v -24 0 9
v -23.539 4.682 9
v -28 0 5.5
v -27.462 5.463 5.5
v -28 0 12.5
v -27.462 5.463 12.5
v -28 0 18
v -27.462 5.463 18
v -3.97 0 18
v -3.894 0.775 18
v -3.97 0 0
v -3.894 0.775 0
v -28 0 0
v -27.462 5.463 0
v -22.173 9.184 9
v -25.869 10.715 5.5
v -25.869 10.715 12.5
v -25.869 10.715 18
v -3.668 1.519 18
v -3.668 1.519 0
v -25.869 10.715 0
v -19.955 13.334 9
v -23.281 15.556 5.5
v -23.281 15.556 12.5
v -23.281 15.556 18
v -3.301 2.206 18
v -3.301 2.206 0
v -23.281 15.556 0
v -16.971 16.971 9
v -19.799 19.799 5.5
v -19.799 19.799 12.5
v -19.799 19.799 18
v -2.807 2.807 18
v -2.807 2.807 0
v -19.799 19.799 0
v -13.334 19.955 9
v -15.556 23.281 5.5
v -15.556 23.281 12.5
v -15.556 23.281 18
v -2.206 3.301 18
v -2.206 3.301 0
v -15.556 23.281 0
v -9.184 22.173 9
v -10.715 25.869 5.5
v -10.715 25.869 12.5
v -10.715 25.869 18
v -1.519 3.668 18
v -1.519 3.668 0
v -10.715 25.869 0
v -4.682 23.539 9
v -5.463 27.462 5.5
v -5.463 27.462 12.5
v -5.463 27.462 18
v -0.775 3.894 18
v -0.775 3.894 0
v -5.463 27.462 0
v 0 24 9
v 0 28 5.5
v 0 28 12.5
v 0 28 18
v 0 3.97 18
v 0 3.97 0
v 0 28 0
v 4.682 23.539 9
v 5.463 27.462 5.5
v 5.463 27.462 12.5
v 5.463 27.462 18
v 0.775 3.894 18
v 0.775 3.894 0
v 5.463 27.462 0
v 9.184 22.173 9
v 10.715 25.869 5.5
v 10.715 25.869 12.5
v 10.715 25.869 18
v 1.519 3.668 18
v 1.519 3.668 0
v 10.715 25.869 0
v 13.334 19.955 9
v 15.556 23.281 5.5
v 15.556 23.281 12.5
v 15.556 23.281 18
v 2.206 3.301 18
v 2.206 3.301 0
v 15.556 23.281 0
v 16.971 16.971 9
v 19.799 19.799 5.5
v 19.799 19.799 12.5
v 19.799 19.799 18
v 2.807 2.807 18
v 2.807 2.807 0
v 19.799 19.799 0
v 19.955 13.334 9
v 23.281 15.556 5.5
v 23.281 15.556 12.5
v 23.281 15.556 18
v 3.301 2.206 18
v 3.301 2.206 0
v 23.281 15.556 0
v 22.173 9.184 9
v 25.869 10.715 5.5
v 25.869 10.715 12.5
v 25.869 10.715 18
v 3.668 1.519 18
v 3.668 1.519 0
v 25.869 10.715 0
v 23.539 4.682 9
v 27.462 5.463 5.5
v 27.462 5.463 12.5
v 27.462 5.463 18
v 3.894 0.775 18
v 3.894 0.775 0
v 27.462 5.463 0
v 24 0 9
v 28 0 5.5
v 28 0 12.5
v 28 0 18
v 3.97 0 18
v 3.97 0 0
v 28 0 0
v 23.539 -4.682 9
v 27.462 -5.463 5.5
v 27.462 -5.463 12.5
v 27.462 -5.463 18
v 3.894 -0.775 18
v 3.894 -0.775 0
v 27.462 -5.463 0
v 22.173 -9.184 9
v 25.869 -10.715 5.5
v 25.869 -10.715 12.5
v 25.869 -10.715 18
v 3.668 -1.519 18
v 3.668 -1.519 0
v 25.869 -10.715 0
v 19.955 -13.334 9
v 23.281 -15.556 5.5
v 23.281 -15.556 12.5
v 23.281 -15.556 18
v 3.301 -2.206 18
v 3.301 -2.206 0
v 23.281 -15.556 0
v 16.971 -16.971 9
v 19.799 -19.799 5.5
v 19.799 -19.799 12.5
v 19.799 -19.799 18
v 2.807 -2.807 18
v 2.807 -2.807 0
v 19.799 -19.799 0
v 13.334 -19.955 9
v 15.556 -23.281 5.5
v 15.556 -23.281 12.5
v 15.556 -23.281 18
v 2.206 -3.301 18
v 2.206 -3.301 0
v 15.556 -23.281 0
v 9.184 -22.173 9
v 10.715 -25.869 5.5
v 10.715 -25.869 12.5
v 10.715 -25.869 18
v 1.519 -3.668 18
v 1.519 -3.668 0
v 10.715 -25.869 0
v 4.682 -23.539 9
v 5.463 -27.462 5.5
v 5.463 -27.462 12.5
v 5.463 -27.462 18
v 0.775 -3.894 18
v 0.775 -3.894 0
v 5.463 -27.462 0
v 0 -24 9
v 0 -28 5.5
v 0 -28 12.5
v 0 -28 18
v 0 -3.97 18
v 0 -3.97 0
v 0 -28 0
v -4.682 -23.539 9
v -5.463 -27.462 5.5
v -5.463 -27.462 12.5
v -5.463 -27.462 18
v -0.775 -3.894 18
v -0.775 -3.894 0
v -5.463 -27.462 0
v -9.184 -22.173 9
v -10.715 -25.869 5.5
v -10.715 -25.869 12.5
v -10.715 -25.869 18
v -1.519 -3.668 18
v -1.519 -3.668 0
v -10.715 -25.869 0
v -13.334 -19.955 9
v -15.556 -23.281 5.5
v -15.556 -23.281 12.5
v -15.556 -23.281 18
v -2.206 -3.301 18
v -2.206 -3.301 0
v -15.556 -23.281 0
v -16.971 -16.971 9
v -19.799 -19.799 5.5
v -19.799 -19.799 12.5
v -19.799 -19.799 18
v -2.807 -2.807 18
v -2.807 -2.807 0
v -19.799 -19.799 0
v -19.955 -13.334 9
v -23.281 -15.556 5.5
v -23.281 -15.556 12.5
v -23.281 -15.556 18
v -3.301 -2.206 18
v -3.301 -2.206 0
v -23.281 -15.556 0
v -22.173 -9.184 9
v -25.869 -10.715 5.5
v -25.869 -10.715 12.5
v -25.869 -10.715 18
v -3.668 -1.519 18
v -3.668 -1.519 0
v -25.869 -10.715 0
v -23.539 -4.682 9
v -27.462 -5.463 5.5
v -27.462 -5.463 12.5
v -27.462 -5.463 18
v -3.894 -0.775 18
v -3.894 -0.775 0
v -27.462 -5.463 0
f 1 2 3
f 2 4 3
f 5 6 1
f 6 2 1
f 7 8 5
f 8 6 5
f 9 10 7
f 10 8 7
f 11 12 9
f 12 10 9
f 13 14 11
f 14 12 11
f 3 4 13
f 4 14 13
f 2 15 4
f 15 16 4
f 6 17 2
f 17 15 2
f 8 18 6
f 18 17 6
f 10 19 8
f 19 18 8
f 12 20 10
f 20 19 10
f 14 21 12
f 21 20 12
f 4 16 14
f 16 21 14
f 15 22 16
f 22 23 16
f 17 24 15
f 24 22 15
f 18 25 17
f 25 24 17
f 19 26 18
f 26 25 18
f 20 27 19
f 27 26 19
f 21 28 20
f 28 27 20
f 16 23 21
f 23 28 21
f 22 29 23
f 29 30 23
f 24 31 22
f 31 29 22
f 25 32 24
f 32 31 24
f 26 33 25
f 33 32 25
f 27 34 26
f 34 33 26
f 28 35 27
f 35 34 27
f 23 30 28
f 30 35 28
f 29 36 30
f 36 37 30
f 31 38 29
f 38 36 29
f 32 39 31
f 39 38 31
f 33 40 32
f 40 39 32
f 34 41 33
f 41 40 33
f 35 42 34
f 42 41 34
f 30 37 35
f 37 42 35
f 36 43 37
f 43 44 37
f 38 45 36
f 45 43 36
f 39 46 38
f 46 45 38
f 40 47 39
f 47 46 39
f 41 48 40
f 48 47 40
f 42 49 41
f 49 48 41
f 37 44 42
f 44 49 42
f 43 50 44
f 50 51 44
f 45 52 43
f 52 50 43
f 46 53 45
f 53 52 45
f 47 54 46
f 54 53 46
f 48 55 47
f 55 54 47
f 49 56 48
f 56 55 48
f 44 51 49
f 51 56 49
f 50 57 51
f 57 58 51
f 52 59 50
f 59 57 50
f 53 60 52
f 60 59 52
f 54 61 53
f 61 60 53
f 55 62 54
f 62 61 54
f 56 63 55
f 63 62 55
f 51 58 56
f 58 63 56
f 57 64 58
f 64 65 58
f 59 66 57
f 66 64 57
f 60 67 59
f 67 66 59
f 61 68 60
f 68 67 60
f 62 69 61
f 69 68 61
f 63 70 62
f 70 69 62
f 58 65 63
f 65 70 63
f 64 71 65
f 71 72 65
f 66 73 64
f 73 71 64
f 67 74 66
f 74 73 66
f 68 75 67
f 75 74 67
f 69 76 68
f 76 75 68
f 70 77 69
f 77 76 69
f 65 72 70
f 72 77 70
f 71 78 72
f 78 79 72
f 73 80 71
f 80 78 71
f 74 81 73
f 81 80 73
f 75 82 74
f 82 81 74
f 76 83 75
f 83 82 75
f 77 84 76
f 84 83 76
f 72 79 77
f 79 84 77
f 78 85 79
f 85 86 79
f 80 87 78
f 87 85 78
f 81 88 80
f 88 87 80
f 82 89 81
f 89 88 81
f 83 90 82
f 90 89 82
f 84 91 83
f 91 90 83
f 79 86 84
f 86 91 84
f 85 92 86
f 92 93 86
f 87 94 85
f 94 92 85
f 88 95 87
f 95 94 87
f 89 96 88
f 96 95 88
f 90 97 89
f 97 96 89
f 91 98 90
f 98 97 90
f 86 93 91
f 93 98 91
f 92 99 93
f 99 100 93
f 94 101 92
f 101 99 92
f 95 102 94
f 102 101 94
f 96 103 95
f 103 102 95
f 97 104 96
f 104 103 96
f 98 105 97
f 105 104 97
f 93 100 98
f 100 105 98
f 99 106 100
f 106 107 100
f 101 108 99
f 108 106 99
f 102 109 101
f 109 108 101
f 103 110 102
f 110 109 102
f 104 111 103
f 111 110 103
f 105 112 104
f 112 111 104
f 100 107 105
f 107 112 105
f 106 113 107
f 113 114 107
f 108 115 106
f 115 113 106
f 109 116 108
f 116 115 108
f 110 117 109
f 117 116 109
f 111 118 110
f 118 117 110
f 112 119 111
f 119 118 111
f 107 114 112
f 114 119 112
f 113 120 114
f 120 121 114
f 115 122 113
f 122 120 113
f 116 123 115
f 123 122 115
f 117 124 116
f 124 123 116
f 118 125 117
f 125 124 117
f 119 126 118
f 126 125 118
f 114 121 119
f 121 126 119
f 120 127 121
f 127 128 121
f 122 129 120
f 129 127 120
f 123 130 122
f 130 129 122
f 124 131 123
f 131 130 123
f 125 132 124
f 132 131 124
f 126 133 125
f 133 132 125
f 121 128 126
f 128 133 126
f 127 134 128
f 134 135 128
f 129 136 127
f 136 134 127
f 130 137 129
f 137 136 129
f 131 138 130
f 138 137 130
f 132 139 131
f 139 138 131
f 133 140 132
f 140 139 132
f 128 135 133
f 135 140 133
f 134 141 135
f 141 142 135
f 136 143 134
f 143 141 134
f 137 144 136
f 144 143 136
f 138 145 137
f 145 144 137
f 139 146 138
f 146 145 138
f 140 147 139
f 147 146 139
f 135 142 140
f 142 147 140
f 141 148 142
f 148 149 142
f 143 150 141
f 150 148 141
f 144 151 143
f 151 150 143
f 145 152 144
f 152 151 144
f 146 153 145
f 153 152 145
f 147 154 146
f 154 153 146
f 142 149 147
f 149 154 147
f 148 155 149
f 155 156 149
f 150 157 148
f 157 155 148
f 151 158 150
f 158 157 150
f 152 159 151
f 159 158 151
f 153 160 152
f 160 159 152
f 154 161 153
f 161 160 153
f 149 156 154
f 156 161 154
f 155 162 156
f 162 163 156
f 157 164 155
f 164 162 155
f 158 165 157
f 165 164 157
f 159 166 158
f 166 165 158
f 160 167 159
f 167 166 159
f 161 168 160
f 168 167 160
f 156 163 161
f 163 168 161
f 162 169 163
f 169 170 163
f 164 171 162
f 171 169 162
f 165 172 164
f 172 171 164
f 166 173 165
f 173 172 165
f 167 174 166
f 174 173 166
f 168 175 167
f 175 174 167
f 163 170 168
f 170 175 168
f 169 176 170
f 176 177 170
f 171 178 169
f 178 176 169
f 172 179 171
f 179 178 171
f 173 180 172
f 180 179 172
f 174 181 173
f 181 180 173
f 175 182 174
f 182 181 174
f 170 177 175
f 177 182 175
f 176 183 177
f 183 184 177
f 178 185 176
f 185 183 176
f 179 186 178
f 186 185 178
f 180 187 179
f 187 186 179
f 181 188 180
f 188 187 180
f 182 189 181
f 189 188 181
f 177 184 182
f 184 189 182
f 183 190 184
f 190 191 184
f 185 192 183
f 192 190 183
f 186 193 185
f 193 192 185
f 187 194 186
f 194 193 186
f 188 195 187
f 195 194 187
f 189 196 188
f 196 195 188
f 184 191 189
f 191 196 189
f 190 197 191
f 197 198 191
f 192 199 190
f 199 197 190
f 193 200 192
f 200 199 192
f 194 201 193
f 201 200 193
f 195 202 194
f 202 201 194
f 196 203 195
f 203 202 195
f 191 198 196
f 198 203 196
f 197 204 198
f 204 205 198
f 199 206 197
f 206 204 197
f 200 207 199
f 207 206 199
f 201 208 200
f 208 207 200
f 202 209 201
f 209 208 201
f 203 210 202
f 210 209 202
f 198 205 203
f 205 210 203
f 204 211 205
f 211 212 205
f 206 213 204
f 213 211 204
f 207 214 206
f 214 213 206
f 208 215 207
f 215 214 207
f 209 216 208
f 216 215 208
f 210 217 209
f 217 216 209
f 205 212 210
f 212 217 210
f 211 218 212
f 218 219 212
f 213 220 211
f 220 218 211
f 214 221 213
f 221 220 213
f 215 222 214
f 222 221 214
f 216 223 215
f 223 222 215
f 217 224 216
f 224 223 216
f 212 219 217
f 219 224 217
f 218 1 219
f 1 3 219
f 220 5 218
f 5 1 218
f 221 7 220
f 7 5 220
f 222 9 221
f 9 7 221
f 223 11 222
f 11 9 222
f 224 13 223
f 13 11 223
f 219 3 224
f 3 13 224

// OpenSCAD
$fn = 32;

// ----------------------------------------------------------------------
// Belt roller: 56 mm barrel, 18 mm wide, bore 7.94 mm
// ----------------------------------------------------------------------

// --- parameters (mm) ---
bore_d = 7.94;            // bore
barrel_d = 56;            // barrel diameter
roller_w = 18;            // roller width
groove_w = 7;             // guide groove width
groove_d = 4;             // guide groove depth

roller_profile = [[3.97, 0], [28, 0], [28, 5.5], [24, 9], [28, 12.5], [28, 18], [3.97, 18]];

/* the profile stays clear of the axis, so the bore comes out of the revolve */
rotate_extrude() polygon(roller_profile);
